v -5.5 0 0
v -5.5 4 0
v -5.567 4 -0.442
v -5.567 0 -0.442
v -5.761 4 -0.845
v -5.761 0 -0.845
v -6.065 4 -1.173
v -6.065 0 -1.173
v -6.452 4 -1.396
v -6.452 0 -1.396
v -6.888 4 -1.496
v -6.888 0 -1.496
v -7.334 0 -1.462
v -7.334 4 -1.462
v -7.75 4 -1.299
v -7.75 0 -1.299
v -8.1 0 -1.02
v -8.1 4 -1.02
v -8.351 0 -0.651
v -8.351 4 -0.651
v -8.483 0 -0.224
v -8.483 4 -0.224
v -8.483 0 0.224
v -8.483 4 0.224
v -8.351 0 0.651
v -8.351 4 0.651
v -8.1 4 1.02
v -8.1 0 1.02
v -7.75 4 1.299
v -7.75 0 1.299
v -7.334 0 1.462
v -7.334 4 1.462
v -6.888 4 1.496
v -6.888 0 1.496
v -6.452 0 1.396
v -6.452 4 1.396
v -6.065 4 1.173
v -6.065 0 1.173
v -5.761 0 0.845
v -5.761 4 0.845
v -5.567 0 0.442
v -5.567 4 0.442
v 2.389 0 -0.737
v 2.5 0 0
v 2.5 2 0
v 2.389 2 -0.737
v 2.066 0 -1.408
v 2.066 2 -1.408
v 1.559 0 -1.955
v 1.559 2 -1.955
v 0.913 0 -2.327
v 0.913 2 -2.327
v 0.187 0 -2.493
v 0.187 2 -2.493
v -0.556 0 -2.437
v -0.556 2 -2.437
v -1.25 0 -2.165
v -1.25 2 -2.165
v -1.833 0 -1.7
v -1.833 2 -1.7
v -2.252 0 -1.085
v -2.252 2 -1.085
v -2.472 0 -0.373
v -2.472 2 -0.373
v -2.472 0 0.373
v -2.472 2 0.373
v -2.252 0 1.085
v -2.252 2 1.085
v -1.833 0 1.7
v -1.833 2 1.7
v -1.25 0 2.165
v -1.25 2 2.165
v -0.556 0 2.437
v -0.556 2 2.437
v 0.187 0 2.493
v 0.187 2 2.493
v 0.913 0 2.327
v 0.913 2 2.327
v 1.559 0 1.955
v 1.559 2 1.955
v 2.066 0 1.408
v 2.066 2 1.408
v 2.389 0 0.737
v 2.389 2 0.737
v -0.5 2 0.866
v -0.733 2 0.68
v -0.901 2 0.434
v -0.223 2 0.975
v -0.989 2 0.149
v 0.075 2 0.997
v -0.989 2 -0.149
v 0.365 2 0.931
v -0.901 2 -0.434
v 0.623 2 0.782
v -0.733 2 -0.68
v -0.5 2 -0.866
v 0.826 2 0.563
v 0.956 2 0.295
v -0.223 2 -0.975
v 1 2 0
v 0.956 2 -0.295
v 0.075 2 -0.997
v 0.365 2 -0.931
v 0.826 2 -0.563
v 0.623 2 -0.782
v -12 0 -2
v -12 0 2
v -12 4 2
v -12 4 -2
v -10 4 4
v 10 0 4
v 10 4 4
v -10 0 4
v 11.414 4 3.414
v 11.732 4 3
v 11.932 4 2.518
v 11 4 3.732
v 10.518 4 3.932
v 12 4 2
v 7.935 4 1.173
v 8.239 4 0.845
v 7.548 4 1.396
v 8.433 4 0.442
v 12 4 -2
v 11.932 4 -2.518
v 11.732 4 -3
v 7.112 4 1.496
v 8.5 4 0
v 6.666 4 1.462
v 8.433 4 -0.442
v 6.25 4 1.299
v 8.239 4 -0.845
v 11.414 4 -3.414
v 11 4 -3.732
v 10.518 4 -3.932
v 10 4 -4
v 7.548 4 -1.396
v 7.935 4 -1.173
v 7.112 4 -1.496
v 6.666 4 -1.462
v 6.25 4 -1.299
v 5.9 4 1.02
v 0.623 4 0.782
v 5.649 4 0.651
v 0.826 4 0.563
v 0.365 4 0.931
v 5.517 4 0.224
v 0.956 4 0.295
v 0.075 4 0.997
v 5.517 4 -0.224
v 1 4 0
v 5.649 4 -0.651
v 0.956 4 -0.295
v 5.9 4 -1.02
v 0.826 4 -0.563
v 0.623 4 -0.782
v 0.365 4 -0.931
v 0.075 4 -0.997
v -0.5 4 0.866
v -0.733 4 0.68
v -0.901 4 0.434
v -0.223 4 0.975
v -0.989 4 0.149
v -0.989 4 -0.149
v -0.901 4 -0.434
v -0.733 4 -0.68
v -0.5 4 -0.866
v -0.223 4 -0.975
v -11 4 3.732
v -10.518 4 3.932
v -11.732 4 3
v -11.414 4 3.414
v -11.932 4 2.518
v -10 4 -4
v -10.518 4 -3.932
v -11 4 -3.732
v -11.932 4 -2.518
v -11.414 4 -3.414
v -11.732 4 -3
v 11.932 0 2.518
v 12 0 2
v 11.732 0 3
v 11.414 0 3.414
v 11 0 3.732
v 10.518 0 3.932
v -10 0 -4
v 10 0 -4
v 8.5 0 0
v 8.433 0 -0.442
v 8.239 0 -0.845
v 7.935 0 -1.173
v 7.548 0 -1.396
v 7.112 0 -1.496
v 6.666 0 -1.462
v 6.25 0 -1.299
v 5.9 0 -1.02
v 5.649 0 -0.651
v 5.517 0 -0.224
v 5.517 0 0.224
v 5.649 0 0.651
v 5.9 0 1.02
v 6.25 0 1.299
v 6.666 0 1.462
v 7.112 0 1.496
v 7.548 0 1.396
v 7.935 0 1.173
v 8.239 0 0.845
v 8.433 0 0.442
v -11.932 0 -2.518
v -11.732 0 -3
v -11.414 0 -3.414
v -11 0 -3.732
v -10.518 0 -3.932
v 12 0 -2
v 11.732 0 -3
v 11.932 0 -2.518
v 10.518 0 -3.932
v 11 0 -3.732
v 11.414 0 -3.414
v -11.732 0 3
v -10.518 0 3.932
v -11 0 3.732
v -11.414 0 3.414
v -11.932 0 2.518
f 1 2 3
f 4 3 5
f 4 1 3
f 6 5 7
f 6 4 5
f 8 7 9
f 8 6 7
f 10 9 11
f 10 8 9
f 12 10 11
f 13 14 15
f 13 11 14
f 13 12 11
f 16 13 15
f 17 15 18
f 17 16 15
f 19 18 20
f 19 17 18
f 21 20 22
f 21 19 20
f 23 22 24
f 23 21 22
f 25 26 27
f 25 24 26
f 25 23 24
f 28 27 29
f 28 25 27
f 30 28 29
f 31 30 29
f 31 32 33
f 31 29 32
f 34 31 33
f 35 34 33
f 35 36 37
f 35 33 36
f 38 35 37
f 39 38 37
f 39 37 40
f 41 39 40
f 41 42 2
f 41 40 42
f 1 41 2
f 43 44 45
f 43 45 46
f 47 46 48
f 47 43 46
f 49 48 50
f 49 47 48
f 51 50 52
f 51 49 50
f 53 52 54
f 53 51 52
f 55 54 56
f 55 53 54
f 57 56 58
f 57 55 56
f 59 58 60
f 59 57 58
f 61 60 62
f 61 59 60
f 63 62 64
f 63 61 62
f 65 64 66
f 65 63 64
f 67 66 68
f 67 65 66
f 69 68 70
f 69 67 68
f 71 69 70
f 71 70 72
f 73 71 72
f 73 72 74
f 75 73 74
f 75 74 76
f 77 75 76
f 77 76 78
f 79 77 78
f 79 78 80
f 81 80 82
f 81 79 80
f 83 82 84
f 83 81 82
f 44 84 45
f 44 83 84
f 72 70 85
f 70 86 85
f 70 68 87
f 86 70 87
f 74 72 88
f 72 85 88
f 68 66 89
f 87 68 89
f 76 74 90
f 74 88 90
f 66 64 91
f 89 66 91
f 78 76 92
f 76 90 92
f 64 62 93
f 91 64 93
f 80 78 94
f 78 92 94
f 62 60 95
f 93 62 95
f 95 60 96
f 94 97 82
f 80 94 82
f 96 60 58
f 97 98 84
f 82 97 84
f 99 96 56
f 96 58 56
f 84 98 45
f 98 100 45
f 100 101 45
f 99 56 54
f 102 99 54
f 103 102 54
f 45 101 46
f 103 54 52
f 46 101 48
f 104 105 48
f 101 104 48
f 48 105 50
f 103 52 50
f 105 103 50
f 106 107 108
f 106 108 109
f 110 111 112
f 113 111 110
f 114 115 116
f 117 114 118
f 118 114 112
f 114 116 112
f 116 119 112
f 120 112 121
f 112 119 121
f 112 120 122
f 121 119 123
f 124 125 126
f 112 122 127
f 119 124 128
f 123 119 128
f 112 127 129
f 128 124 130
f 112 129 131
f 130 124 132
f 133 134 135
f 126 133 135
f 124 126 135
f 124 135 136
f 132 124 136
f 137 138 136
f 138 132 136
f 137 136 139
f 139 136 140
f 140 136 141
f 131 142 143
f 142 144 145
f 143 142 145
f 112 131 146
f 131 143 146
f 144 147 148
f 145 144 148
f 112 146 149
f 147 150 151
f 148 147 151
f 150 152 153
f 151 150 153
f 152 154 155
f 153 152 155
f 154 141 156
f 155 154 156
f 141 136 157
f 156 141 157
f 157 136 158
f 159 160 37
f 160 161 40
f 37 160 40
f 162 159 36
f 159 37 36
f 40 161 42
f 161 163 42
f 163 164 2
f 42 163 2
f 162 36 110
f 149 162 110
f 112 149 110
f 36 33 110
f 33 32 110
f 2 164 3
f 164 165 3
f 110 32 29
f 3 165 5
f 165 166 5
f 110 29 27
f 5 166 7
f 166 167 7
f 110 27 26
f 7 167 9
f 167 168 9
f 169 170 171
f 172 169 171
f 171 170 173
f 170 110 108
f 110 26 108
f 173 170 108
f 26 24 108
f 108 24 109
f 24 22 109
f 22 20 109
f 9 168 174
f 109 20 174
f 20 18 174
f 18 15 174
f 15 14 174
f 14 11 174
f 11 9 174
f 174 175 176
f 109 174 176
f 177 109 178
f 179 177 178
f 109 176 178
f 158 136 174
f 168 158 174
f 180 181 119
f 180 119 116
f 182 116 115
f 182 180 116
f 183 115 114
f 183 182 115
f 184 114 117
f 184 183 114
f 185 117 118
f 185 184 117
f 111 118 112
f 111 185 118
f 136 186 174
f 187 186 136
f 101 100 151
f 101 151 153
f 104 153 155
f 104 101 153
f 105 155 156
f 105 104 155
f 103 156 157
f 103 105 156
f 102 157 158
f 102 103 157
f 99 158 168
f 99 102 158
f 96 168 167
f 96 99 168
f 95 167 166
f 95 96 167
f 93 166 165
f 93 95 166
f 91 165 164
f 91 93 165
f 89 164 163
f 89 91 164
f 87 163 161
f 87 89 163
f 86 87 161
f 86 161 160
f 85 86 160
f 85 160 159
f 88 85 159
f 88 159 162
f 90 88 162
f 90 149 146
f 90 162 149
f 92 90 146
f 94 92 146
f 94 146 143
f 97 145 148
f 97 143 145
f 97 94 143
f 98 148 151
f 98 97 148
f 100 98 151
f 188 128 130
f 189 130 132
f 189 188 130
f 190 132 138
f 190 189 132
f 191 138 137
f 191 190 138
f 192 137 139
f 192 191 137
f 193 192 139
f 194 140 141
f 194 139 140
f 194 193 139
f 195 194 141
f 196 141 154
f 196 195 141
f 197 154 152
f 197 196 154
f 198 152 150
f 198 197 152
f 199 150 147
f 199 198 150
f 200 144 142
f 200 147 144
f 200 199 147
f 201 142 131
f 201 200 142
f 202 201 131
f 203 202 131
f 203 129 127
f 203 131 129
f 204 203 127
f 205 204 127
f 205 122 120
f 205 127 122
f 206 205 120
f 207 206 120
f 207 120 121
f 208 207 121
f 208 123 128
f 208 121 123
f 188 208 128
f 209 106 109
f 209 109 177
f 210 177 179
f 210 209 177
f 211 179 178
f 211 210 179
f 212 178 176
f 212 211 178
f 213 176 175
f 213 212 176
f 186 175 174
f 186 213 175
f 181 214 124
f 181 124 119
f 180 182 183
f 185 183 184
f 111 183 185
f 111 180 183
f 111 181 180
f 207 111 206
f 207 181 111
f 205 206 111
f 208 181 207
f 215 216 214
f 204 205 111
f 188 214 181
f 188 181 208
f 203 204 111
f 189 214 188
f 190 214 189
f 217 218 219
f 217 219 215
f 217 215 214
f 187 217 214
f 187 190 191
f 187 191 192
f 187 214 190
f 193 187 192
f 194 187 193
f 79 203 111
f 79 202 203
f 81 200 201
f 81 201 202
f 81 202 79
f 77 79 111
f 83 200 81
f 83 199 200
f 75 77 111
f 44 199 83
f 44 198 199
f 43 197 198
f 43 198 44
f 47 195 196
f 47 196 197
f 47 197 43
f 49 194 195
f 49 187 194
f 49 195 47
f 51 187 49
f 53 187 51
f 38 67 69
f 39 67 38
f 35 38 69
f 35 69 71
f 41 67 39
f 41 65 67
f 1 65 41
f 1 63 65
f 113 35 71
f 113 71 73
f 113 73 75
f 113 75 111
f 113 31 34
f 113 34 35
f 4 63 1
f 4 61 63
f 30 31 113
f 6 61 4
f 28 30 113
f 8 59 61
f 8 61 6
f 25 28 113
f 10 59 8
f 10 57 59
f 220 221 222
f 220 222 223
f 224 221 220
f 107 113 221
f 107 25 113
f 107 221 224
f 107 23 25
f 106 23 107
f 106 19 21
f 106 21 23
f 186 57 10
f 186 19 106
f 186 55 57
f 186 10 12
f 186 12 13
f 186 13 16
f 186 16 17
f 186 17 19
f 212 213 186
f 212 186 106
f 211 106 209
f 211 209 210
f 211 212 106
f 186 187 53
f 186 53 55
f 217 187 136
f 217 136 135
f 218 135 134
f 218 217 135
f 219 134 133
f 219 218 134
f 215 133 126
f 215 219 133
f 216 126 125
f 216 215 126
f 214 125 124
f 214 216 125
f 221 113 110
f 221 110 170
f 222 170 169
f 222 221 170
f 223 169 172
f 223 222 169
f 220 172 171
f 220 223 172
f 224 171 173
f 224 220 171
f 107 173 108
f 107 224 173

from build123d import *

# Parameters (mm, degrees)
BOSS_EXTRUDE1_DEPTH = 4
CUT_EXTRUDE1_REACH  = 15.266
SKETCH1_3_R         = 1
SKETCH1_3_R_2       = 1.5
SKETCH1_4_R         = 2.5
CUT_EXTRUDE2_DEPTH  = 2


with BuildPart() as part:
    # Sketch1 → Boss-Extrude1 (new body)
    with BuildSketch(Plane(origin=(0, 0, 0), x_dir=(1, 0, 0), z_dir=(0, 1, 0))):
        with BuildLine():
            Line((0, 4), (10, 4))
            ThreePointArc((10, 4), (11.414213562, 3.414213562), (12, 2))
            Line((12, 2), (12, -2))
            ThreePointArc((12, -2), (11.414213562, -3.414213562), (10, -4))
            Line((10, -4), (0, -4))
            Line((0, -4), (-10, -4))
            ThreePointArc((-10, -4), (-11.414213562, -3.414213562), (-12, -2))
            Line((-12, -2), (-12, 2))
            ThreePointArc((-12, 2), (-11.414213562, 3.414213562), (-10, 4))
            Line((-10, 4), (0, 4))
        make_face()
    extrude(amount=BOSS_EXTRUDE1_DEPTH)

    # Sketch1<3> → Cut-Extrude1 (cut, up to next)
    with BuildSketch(Plane(origin=(0, 0, 0), x_dir=(1, 0, 0), z_dir=(0, 1, 0)), mode=Mode.PRIVATE) as cut_extrude1_sk1:
        Circle(SKETCH1_3_R)
    cut_extrude1_tool1 = extrude(cut_extrude1_sk1.sketch, amount=CUT_EXTRUDE1_REACH, mode=Mode.PRIVATE) & part.part
    # Sketch1<3> → Cut-Extrude1 (cut, up to next)
    with BuildSketch(Plane(origin=(0, 0, 0), x_dir=(1, 0, 0), z_dir=(0, 1, 0)), mode=Mode.PRIVATE) as cut_extrude1_sk2:
        with Locations((-7, 0)):
            Circle(SKETCH1_3_R_2)
    cut_extrude1_tool2 = extrude(cut_extrude1_sk2.sketch, amount=CUT_EXTRUDE1_REACH, mode=Mode.PRIVATE) & part.part
    # Sketch1<3> → Cut-Extrude1 (cut, up to next)
    with BuildSketch(Plane(origin=(0, 0, 0), x_dir=(1, 0, 0), z_dir=(0, 1, 0)), mode=Mode.PRIVATE) as cut_extrude1_sk3:
        with Locations((7, 0)):
            Circle(SKETCH1_3_R_2)
    cut_extrude1_tool3 = extrude(cut_extrude1_sk3.sketch, amount=CUT_EXTRUDE1_REACH, mode=Mode.PRIVATE) & part.part
    add(cut_extrude1_tool1.solids().sort_by_distance((0, 0, 0))[0], mode=Mode.SUBTRACT)
    add(cut_extrude1_tool2.solids().sort_by_distance((-7, 0, 0))[0], mode=Mode.SUBTRACT)
    add(cut_extrude1_tool3.solids().sort_by_distance((7, 0, 0))[0], mode=Mode.SUBTRACT)

    # Sketch1<4> → Cut-Extrude2 (cut)
    with BuildSketch(Plane(origin=(0, 0, 0), x_dir=(1, 0, 0), z_dir=(0, 1, 0))):
        Circle(SKETCH1_4_R)
    extrude(amount=CUT_EXTRUDE2_DEPTH, mode=Mode.SUBTRACT)


solid = part.part
